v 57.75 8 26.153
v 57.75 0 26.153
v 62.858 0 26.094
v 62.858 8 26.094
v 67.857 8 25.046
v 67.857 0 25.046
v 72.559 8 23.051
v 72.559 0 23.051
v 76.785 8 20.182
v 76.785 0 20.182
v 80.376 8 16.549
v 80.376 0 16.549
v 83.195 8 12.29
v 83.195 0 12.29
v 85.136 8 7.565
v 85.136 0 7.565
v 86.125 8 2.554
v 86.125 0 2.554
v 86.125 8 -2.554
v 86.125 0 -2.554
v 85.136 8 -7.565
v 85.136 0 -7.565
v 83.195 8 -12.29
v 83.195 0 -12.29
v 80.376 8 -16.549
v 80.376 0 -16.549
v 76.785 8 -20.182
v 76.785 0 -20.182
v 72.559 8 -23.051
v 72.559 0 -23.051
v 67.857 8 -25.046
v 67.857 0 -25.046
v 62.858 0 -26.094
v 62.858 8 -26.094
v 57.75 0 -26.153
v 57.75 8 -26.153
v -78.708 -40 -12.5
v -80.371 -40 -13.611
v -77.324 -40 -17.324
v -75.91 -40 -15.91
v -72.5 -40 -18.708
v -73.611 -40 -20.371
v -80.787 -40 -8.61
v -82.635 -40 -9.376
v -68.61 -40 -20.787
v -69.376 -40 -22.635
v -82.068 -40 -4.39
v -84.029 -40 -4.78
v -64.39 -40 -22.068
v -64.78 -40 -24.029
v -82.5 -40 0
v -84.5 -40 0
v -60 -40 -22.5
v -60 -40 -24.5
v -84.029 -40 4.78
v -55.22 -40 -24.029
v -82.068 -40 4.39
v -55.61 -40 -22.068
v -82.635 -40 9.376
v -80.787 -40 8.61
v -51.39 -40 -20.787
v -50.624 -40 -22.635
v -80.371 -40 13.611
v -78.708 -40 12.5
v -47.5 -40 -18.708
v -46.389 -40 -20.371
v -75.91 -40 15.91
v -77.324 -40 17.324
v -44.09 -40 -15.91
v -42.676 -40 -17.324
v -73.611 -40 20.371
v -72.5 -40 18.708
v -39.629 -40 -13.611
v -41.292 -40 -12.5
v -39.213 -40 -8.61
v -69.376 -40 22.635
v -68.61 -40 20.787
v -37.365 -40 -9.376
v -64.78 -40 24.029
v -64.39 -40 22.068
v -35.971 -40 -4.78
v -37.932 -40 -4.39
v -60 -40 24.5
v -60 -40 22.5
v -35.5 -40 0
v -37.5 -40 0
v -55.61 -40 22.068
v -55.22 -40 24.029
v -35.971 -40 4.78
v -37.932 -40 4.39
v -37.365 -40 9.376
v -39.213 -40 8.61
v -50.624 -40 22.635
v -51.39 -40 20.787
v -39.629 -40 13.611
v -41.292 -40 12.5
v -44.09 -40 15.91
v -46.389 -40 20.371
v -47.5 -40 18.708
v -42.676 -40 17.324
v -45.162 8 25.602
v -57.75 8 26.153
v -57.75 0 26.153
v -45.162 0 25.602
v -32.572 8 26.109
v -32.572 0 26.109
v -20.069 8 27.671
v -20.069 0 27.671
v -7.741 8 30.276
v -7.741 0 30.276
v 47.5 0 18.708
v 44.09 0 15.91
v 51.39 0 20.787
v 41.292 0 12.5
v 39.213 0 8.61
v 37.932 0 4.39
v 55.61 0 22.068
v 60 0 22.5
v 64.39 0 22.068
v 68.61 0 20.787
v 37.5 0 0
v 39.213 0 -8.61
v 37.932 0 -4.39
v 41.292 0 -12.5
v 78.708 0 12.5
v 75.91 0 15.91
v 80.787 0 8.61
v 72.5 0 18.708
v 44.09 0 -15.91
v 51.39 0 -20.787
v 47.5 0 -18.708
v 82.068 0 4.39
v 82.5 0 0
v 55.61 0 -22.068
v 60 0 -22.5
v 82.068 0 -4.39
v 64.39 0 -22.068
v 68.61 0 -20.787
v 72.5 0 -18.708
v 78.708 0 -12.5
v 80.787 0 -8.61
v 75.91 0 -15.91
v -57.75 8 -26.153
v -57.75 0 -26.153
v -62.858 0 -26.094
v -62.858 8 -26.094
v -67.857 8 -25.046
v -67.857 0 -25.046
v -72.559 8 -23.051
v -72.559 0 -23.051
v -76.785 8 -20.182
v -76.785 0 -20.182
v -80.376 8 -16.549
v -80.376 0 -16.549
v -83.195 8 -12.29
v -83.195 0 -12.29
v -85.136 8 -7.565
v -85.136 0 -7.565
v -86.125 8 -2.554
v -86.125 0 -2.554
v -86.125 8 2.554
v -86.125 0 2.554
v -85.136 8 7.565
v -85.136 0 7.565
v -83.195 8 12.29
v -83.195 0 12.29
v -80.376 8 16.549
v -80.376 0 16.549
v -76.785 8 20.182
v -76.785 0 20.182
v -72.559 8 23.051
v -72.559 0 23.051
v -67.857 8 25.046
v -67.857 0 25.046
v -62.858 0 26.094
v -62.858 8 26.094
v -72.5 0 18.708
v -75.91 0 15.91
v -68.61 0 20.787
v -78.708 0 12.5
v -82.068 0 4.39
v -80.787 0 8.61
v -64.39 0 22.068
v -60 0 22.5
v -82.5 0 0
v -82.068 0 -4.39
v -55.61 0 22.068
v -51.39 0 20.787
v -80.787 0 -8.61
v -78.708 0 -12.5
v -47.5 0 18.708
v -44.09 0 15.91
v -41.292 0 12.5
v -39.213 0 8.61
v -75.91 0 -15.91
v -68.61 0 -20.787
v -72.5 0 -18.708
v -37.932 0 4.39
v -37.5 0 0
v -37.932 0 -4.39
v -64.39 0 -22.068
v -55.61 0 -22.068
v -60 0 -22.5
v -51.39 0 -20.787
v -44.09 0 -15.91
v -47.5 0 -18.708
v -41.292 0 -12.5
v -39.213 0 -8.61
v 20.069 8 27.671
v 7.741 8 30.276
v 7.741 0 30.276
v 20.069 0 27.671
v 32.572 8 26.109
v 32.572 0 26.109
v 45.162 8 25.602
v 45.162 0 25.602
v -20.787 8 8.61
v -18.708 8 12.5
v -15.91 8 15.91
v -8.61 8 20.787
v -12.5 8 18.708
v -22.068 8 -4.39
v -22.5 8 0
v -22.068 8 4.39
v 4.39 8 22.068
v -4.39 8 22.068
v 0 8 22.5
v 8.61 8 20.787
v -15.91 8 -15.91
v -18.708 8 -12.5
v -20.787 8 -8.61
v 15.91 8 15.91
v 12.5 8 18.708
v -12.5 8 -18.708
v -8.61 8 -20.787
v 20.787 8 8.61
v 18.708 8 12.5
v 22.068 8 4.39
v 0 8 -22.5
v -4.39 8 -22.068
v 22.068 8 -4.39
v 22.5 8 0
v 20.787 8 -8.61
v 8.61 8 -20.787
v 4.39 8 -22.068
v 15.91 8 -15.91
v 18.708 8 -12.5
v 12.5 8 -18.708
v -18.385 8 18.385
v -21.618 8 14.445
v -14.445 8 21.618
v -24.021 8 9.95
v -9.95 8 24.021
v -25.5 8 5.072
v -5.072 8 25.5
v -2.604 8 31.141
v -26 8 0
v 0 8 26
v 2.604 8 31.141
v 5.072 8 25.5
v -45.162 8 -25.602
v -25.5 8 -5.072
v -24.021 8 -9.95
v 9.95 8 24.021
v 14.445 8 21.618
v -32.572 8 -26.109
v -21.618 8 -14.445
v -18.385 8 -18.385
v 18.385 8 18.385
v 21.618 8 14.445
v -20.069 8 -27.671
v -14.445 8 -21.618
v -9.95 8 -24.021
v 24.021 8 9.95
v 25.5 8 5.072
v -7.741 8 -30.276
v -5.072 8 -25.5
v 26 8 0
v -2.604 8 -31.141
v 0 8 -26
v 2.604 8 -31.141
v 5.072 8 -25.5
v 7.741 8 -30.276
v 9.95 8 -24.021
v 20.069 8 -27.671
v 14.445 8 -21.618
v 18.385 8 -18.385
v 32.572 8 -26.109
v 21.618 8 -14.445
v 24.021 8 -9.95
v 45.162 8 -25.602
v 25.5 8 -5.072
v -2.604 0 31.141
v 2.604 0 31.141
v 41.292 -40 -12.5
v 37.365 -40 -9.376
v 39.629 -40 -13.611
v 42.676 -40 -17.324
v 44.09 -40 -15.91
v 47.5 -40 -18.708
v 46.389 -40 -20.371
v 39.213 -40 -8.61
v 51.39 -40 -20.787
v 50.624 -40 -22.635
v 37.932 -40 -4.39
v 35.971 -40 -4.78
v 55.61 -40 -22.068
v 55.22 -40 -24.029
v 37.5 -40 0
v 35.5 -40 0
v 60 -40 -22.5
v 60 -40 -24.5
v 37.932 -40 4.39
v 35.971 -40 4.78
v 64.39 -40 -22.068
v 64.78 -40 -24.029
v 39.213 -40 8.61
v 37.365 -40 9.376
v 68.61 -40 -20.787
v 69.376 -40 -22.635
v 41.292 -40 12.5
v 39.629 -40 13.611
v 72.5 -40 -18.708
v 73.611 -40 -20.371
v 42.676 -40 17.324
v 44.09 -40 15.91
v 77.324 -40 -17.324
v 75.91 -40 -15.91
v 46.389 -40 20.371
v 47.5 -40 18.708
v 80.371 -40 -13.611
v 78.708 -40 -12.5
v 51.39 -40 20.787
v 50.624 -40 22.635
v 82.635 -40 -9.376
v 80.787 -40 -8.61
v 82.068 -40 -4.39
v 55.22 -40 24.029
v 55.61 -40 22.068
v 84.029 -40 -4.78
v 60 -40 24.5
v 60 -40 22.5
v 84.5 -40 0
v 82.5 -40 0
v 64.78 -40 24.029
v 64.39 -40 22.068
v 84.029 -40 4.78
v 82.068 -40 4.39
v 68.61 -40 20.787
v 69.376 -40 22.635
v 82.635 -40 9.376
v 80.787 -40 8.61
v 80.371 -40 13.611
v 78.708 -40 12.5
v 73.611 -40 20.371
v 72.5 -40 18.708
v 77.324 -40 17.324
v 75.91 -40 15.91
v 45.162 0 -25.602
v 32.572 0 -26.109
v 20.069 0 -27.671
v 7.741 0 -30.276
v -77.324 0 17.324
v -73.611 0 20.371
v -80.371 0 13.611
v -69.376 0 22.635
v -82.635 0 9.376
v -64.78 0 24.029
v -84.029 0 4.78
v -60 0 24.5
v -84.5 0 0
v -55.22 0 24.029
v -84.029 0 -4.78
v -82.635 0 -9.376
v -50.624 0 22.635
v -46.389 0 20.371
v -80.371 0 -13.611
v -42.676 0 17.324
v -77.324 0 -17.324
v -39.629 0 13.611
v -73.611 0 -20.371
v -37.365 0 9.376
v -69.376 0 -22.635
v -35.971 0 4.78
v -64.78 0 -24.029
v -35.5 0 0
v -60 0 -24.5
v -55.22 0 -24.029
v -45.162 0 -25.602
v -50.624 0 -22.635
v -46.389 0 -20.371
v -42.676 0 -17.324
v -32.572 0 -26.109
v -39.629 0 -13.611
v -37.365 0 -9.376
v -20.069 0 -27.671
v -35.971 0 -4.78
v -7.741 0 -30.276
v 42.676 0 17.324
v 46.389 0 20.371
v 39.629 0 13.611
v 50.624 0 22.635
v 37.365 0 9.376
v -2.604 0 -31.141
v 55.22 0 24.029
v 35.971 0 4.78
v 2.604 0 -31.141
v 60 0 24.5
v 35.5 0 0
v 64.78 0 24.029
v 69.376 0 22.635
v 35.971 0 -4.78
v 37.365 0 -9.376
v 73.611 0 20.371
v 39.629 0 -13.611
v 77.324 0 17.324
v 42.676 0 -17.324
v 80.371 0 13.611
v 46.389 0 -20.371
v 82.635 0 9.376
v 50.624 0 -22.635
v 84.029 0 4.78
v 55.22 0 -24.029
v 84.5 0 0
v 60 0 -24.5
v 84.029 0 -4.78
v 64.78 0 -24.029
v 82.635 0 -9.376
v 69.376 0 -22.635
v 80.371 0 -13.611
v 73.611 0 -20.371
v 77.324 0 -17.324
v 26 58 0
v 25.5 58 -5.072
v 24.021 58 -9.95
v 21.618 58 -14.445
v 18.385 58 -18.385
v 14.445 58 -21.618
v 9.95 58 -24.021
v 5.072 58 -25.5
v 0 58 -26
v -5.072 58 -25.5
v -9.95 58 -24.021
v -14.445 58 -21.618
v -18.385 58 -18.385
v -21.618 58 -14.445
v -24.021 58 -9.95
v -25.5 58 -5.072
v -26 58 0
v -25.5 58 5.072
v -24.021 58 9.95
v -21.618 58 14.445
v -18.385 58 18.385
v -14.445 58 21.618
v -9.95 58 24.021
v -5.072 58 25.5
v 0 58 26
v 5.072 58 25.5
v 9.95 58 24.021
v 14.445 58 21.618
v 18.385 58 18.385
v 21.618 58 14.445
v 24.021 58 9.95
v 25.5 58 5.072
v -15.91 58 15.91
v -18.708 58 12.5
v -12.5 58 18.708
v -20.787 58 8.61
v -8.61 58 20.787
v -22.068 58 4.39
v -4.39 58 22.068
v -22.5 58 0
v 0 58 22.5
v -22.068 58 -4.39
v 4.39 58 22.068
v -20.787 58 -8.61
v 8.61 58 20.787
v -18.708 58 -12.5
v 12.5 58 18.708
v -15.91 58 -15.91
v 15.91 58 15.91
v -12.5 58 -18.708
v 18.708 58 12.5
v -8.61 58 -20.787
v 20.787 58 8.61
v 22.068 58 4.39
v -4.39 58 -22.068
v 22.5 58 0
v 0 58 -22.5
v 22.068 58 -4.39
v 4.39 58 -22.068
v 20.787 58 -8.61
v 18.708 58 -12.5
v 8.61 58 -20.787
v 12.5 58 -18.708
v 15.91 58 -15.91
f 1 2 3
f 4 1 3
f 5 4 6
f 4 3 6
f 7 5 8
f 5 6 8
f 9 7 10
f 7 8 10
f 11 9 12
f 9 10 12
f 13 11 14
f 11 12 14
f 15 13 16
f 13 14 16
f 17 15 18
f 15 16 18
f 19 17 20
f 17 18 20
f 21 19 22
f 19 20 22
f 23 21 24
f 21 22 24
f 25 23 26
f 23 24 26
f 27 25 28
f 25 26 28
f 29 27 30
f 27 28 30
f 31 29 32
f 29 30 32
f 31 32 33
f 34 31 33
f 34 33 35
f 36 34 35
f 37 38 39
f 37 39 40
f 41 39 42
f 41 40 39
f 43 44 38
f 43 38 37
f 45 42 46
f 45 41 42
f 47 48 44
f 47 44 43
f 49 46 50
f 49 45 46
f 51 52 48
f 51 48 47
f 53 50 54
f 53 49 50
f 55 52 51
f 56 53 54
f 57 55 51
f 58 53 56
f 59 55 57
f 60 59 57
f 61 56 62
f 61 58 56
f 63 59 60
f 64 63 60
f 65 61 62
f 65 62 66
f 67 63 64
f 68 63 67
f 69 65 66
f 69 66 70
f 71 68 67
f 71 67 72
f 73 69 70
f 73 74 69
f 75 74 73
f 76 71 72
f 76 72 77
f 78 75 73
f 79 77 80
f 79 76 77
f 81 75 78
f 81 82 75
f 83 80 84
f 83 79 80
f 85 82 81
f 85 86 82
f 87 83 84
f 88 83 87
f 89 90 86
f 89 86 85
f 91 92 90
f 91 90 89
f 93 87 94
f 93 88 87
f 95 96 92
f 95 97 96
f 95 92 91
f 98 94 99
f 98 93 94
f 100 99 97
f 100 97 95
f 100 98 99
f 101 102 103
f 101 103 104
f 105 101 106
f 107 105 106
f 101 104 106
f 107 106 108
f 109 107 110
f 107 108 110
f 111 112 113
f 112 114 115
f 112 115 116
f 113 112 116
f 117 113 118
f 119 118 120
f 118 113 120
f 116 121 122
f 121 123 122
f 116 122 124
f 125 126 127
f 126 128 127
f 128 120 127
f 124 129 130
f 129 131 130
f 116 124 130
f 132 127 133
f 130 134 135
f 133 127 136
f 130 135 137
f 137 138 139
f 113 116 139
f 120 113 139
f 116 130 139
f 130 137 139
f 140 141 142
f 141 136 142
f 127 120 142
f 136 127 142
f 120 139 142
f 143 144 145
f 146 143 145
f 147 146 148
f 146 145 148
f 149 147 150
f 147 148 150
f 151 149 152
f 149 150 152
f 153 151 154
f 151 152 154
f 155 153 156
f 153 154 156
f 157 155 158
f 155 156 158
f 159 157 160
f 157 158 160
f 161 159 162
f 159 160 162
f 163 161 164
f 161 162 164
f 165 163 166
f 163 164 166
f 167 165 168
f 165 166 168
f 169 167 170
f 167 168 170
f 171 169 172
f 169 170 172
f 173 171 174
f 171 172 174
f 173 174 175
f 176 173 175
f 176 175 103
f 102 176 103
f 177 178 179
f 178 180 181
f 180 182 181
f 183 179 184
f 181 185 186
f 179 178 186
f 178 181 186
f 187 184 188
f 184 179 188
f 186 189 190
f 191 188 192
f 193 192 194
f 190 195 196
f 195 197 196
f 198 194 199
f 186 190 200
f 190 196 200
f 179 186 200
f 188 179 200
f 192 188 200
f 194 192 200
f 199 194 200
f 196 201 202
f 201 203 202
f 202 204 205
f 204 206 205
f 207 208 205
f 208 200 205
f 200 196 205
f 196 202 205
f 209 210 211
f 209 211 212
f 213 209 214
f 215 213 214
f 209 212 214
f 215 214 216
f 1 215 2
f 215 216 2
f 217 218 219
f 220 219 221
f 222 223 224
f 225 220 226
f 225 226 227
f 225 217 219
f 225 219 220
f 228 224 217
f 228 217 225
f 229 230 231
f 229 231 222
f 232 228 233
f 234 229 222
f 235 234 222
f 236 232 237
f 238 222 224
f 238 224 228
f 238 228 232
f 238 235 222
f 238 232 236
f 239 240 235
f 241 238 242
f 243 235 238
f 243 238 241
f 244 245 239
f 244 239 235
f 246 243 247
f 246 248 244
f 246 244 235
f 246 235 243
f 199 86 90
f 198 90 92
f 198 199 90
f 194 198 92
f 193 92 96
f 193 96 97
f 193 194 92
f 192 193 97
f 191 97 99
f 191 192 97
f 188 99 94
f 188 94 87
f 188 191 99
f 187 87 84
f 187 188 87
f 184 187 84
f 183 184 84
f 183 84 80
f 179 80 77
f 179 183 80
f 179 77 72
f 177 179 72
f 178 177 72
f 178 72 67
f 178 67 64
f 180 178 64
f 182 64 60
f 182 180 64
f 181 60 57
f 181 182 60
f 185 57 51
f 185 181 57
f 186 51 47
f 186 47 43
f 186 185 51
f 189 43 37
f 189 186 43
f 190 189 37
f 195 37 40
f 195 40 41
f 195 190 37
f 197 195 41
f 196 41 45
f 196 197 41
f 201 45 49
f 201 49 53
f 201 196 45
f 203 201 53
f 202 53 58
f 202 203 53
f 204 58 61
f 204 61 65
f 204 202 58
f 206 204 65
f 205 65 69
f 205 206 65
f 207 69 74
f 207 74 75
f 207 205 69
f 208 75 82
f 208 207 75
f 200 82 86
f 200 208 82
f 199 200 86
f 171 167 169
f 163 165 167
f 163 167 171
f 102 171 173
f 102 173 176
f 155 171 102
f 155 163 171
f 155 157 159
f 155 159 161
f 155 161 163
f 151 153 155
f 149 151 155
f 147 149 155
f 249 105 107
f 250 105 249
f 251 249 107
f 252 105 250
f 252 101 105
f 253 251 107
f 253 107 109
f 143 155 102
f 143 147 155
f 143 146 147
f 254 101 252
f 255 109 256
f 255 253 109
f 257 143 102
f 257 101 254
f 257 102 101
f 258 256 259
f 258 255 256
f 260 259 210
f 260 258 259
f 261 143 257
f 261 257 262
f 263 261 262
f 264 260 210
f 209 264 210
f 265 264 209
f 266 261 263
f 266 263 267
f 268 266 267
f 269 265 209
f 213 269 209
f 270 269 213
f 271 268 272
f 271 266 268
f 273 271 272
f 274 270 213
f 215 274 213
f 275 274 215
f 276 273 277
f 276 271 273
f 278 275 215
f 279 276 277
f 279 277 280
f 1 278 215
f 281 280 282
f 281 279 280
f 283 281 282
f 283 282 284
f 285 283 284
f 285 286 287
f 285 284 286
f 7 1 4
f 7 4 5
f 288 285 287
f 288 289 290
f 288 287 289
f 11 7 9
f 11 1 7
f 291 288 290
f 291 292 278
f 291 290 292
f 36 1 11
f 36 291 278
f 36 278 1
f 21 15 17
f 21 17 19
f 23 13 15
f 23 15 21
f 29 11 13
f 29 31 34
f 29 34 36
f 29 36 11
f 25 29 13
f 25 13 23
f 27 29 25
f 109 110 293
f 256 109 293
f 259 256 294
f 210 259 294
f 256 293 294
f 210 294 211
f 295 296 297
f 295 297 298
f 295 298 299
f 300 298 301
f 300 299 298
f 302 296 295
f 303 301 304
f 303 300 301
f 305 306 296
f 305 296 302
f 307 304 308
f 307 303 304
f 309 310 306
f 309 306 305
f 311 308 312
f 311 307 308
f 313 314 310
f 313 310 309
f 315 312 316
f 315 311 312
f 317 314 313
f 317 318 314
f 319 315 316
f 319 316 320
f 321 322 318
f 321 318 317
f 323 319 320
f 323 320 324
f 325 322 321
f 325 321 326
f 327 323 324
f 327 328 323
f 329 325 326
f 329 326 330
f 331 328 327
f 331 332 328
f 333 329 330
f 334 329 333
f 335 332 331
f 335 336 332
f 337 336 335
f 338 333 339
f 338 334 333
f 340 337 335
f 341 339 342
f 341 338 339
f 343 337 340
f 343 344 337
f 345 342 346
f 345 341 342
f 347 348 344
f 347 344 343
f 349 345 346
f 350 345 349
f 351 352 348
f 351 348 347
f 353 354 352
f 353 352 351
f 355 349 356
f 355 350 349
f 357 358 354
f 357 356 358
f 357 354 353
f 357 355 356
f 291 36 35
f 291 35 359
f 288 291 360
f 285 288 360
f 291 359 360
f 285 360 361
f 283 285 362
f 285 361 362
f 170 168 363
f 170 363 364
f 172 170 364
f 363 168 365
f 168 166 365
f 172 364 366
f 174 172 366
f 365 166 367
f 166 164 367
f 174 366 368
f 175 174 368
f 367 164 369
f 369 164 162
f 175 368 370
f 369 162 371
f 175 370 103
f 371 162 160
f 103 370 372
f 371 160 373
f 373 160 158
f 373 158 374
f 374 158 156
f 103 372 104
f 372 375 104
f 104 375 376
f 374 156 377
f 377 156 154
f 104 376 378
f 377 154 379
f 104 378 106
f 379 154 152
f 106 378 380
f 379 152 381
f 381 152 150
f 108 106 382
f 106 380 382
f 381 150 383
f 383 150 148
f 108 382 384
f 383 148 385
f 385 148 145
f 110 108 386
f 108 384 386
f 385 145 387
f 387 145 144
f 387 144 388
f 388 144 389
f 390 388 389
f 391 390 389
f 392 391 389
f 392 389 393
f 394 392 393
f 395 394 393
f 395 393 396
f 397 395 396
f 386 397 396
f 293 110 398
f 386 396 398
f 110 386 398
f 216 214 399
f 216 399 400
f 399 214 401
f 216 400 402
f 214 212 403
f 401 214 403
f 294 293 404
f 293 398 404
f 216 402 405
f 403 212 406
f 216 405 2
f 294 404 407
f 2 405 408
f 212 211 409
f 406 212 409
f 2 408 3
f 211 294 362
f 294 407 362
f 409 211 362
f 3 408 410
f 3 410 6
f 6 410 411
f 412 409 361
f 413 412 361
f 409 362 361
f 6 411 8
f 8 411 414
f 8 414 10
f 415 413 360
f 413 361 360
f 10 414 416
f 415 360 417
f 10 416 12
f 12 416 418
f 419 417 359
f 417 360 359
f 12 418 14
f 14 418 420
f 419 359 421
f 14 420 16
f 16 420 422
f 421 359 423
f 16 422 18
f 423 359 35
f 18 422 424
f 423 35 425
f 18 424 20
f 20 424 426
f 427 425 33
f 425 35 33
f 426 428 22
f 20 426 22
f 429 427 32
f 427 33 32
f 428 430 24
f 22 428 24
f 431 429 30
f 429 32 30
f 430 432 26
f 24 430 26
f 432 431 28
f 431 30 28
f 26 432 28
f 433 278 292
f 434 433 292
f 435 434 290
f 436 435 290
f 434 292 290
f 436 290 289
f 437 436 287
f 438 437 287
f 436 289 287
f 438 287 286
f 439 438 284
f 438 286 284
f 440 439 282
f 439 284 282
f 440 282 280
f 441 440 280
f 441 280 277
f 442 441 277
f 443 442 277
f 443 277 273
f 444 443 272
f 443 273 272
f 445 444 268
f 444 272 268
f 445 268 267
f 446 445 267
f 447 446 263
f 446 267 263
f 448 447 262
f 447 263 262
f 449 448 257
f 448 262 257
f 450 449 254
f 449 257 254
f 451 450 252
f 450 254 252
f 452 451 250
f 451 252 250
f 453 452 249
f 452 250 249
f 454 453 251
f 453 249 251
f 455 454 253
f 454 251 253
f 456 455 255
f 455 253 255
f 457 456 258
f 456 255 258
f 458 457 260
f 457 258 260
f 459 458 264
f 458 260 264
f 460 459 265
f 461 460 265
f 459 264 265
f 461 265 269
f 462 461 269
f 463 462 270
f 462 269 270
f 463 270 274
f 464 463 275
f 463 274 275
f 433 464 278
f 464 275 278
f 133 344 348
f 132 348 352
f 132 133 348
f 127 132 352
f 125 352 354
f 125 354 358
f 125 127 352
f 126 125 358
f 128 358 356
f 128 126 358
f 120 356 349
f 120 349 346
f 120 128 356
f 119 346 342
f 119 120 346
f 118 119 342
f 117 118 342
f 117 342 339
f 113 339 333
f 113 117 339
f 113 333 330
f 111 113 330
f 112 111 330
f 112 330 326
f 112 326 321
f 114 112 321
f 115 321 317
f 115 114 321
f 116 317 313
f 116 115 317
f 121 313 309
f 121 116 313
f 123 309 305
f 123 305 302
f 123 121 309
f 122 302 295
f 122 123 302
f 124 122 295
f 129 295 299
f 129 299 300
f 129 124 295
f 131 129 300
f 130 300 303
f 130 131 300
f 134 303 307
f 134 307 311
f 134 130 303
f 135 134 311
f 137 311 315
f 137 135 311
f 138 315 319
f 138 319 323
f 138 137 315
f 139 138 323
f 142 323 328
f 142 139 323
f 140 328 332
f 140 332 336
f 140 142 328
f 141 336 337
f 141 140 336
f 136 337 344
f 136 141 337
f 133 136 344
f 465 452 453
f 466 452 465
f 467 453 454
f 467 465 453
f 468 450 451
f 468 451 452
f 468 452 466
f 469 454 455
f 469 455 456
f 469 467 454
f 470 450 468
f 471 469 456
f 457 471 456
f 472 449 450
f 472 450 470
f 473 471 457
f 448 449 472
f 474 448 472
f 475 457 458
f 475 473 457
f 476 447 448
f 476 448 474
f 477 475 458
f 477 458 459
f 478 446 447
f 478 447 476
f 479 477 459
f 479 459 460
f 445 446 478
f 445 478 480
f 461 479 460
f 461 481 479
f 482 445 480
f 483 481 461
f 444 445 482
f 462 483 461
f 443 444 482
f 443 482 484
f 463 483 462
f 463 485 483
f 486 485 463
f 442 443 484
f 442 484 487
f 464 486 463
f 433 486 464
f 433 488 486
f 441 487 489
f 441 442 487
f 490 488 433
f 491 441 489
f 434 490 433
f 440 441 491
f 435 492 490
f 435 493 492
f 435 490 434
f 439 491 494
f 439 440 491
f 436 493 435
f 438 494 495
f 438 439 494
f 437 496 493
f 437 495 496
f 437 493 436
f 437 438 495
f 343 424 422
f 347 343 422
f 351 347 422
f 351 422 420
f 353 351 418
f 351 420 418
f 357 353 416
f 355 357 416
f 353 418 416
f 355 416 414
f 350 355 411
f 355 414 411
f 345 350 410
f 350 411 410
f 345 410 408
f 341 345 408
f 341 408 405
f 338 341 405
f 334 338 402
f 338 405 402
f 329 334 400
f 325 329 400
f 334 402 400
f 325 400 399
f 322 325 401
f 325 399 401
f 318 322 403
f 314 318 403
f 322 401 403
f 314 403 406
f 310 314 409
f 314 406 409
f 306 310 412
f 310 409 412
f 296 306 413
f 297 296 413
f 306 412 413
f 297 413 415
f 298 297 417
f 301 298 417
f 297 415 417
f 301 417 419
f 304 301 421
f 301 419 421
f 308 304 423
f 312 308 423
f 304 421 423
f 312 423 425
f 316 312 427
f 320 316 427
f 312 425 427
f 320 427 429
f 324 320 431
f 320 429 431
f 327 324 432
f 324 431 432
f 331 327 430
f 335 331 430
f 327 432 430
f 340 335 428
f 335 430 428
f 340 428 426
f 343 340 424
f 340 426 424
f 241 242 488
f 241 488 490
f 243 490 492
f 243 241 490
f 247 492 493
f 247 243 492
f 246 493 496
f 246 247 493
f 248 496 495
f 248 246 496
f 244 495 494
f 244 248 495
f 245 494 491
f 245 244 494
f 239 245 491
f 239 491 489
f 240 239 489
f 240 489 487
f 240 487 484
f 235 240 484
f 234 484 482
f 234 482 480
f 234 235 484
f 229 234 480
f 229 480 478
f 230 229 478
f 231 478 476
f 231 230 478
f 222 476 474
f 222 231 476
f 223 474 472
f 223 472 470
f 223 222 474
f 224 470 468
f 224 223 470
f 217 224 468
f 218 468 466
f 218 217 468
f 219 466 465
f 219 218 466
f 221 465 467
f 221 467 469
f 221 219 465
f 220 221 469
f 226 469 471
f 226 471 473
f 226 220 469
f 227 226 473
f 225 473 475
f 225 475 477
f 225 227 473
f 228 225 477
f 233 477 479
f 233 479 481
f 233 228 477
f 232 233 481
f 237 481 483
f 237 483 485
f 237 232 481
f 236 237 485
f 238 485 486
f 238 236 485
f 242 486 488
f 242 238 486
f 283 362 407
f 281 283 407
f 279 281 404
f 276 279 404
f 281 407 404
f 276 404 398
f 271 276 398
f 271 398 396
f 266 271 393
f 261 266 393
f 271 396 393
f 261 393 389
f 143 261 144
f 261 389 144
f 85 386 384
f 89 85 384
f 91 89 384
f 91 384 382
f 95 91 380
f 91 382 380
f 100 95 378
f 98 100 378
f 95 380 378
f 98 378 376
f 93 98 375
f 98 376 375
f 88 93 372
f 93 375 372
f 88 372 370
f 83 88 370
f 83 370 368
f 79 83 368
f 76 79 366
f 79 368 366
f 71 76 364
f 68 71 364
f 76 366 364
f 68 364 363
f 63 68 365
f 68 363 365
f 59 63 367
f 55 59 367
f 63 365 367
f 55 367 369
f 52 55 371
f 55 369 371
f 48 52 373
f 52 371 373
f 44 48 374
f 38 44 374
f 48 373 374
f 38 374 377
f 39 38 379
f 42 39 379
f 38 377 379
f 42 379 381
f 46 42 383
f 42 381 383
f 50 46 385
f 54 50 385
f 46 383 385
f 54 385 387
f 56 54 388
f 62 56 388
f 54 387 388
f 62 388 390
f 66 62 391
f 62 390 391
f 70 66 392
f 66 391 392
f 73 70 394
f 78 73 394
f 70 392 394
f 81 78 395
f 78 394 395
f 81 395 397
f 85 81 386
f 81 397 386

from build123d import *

# Parameters (mm, degrees)
BOSS_EXTRUDE1_DEPTH = 8
SKETCH2_R           = 26
SKETCH2_R_2         = 22.5
EXTRUDE_THIN1_DEPTH = 50
SKETCH3_R           = 24.5
SKETCH3_R_2         = 22.5
EXTRUDE_THIN2_DEPTH = 40


with BuildPart() as part:
    # Sketch1 → Boss-Extrude1 (new body)
    with BuildSketch(Plane(origin=(0, 0, 0), x_dir=(1, 0, 0), z_dir=(0, 1, 0))):
        with BuildLine():
            ThreePointArc((-7.74066092, -30.276140252), (0, -31.25), (7.74066092, -30.276140252))
            ThreePointArc((7.74066092, -30.276140252), (32.571933158, -26.108732409), (57.750443262, -26.153431792))
            ThreePointArc((57.750443262, -26.153431792), (86.25, 0), (57.750443262, 26.153431792))
            ThreePointArc((57.750443262, 26.153431792), (32.571933158, 26.108732409), (7.74066092, 30.276140252))
            ThreePointArc((7.74066092, 30.276140252), (0, 31.25), (-7.74066092, 30.276140252))
            ThreePointArc((-7.74066092, 30.276140252), (-32.571933158, 26.108732409), (-57.750443262, 26.153431792))
            ThreePointArc((-57.750443262, 26.153431792), (-86.25, 0), (-57.750443262, -26.153431792))
            ThreePointArc((-57.750443262, -26.153431792), (-32.571933158, -26.108732409), (-7.74066092, -30.276140252))
        make_face()
    extrude(amount=BOSS_EXTRUDE1_DEPTH)

    # Sketch2 → Extrude-Thin1 (add)
    with BuildSketch(Plane(origin=(0, 8, 0), x_dir=(1, 0, 0), z_dir=(0, 1, 0))):
        Circle(SKETCH2_R)
        Circle(SKETCH2_R_2, mode=Mode.SUBTRACT)
    extrude(amount=EXTRUDE_THIN1_DEPTH)

    # Sketch3 → Extrude-Thin2 (add)
    # profile 1 of 2: a face of its own
    with BuildSketch(Plane.XZ):
        with Locations((-60, 0)):
            Circle(SKETCH3_R)
        with Locations((-60, 0)):
            Circle(SKETCH3_R_2, mode=Mode.SUBTRACT)
    # profile 2 of 2: a face of its own
    with BuildSketch(Plane.XZ):
        with Locations((60, 0)):
            Circle(SKETCH3_R)
        with Locations((60, 0)):
            Circle(SKETCH3_R_2, mode=Mode.SUBTRACT)
    extrude(amount=EXTRUDE_THIN2_DEPTH)


solid = part.part
